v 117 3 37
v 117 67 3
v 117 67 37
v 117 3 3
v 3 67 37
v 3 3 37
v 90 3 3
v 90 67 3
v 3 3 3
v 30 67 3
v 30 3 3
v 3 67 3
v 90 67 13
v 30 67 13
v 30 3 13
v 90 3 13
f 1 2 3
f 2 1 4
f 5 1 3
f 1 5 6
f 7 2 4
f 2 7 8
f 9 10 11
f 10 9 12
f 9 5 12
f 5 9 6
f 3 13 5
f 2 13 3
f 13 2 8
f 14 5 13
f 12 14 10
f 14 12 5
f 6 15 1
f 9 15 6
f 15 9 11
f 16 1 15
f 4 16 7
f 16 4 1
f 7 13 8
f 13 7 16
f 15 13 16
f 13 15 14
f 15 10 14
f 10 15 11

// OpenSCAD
// Buffer tank for mini horizontal gel-electrophoresis box
// Print orientation: base on XY plane, open top facing +Z

// ---------- Parameters ----------
outer_x      = 120;   // outer length (X)
outer_y      = 70;    // outer width (Y)
outer_z      = 40;    // outer height (Z)
wall         = 3;     // wall thickness
floor        = 3;     // floor thickness
platform_x   = 60;    // platform length in X (centred)
platform_top = 13;    // platform top height above tank base (z)
hole_d       = 2;     // electrode hole diameter
hole_y       = 0;     // electrode hole Y position
hole_z       = 30;    // electrode hole Z position

eps          = 0.5;   // cutter overshoot past faces
$fn          = 64;    // curve resolution

// ---------- Derived ----------
inner_x = outer_x - 2 * wall;   // 114
inner_y = outer_y - 2 * wall;   // 64
inner_z = outer_z - wall - floor; // 34 (inner floor at z=0, top at z=34)

// ---------- Model ----------
difference() {
    // Tank body (open top)
    translate([wall, wall, floor])
        cube([inner_x, inner_y, inner_z]);

    // Raised platform for gel tray
    translate([(outer_x - platform_x) / 2, wall, floor])
        cube([platform_x, inner_y, platform_top - floor]);

    // Horizontal electrode holes through each end wall (along X)
    for (sx = [-1, 1])
        translate([sx > 0 ? outer_x - eps : -eps, hole_y, hole_z])
            rotate([0, 90, 0])
                cylinder(d = hole_d, h = outer_z + 2 * eps);
}
